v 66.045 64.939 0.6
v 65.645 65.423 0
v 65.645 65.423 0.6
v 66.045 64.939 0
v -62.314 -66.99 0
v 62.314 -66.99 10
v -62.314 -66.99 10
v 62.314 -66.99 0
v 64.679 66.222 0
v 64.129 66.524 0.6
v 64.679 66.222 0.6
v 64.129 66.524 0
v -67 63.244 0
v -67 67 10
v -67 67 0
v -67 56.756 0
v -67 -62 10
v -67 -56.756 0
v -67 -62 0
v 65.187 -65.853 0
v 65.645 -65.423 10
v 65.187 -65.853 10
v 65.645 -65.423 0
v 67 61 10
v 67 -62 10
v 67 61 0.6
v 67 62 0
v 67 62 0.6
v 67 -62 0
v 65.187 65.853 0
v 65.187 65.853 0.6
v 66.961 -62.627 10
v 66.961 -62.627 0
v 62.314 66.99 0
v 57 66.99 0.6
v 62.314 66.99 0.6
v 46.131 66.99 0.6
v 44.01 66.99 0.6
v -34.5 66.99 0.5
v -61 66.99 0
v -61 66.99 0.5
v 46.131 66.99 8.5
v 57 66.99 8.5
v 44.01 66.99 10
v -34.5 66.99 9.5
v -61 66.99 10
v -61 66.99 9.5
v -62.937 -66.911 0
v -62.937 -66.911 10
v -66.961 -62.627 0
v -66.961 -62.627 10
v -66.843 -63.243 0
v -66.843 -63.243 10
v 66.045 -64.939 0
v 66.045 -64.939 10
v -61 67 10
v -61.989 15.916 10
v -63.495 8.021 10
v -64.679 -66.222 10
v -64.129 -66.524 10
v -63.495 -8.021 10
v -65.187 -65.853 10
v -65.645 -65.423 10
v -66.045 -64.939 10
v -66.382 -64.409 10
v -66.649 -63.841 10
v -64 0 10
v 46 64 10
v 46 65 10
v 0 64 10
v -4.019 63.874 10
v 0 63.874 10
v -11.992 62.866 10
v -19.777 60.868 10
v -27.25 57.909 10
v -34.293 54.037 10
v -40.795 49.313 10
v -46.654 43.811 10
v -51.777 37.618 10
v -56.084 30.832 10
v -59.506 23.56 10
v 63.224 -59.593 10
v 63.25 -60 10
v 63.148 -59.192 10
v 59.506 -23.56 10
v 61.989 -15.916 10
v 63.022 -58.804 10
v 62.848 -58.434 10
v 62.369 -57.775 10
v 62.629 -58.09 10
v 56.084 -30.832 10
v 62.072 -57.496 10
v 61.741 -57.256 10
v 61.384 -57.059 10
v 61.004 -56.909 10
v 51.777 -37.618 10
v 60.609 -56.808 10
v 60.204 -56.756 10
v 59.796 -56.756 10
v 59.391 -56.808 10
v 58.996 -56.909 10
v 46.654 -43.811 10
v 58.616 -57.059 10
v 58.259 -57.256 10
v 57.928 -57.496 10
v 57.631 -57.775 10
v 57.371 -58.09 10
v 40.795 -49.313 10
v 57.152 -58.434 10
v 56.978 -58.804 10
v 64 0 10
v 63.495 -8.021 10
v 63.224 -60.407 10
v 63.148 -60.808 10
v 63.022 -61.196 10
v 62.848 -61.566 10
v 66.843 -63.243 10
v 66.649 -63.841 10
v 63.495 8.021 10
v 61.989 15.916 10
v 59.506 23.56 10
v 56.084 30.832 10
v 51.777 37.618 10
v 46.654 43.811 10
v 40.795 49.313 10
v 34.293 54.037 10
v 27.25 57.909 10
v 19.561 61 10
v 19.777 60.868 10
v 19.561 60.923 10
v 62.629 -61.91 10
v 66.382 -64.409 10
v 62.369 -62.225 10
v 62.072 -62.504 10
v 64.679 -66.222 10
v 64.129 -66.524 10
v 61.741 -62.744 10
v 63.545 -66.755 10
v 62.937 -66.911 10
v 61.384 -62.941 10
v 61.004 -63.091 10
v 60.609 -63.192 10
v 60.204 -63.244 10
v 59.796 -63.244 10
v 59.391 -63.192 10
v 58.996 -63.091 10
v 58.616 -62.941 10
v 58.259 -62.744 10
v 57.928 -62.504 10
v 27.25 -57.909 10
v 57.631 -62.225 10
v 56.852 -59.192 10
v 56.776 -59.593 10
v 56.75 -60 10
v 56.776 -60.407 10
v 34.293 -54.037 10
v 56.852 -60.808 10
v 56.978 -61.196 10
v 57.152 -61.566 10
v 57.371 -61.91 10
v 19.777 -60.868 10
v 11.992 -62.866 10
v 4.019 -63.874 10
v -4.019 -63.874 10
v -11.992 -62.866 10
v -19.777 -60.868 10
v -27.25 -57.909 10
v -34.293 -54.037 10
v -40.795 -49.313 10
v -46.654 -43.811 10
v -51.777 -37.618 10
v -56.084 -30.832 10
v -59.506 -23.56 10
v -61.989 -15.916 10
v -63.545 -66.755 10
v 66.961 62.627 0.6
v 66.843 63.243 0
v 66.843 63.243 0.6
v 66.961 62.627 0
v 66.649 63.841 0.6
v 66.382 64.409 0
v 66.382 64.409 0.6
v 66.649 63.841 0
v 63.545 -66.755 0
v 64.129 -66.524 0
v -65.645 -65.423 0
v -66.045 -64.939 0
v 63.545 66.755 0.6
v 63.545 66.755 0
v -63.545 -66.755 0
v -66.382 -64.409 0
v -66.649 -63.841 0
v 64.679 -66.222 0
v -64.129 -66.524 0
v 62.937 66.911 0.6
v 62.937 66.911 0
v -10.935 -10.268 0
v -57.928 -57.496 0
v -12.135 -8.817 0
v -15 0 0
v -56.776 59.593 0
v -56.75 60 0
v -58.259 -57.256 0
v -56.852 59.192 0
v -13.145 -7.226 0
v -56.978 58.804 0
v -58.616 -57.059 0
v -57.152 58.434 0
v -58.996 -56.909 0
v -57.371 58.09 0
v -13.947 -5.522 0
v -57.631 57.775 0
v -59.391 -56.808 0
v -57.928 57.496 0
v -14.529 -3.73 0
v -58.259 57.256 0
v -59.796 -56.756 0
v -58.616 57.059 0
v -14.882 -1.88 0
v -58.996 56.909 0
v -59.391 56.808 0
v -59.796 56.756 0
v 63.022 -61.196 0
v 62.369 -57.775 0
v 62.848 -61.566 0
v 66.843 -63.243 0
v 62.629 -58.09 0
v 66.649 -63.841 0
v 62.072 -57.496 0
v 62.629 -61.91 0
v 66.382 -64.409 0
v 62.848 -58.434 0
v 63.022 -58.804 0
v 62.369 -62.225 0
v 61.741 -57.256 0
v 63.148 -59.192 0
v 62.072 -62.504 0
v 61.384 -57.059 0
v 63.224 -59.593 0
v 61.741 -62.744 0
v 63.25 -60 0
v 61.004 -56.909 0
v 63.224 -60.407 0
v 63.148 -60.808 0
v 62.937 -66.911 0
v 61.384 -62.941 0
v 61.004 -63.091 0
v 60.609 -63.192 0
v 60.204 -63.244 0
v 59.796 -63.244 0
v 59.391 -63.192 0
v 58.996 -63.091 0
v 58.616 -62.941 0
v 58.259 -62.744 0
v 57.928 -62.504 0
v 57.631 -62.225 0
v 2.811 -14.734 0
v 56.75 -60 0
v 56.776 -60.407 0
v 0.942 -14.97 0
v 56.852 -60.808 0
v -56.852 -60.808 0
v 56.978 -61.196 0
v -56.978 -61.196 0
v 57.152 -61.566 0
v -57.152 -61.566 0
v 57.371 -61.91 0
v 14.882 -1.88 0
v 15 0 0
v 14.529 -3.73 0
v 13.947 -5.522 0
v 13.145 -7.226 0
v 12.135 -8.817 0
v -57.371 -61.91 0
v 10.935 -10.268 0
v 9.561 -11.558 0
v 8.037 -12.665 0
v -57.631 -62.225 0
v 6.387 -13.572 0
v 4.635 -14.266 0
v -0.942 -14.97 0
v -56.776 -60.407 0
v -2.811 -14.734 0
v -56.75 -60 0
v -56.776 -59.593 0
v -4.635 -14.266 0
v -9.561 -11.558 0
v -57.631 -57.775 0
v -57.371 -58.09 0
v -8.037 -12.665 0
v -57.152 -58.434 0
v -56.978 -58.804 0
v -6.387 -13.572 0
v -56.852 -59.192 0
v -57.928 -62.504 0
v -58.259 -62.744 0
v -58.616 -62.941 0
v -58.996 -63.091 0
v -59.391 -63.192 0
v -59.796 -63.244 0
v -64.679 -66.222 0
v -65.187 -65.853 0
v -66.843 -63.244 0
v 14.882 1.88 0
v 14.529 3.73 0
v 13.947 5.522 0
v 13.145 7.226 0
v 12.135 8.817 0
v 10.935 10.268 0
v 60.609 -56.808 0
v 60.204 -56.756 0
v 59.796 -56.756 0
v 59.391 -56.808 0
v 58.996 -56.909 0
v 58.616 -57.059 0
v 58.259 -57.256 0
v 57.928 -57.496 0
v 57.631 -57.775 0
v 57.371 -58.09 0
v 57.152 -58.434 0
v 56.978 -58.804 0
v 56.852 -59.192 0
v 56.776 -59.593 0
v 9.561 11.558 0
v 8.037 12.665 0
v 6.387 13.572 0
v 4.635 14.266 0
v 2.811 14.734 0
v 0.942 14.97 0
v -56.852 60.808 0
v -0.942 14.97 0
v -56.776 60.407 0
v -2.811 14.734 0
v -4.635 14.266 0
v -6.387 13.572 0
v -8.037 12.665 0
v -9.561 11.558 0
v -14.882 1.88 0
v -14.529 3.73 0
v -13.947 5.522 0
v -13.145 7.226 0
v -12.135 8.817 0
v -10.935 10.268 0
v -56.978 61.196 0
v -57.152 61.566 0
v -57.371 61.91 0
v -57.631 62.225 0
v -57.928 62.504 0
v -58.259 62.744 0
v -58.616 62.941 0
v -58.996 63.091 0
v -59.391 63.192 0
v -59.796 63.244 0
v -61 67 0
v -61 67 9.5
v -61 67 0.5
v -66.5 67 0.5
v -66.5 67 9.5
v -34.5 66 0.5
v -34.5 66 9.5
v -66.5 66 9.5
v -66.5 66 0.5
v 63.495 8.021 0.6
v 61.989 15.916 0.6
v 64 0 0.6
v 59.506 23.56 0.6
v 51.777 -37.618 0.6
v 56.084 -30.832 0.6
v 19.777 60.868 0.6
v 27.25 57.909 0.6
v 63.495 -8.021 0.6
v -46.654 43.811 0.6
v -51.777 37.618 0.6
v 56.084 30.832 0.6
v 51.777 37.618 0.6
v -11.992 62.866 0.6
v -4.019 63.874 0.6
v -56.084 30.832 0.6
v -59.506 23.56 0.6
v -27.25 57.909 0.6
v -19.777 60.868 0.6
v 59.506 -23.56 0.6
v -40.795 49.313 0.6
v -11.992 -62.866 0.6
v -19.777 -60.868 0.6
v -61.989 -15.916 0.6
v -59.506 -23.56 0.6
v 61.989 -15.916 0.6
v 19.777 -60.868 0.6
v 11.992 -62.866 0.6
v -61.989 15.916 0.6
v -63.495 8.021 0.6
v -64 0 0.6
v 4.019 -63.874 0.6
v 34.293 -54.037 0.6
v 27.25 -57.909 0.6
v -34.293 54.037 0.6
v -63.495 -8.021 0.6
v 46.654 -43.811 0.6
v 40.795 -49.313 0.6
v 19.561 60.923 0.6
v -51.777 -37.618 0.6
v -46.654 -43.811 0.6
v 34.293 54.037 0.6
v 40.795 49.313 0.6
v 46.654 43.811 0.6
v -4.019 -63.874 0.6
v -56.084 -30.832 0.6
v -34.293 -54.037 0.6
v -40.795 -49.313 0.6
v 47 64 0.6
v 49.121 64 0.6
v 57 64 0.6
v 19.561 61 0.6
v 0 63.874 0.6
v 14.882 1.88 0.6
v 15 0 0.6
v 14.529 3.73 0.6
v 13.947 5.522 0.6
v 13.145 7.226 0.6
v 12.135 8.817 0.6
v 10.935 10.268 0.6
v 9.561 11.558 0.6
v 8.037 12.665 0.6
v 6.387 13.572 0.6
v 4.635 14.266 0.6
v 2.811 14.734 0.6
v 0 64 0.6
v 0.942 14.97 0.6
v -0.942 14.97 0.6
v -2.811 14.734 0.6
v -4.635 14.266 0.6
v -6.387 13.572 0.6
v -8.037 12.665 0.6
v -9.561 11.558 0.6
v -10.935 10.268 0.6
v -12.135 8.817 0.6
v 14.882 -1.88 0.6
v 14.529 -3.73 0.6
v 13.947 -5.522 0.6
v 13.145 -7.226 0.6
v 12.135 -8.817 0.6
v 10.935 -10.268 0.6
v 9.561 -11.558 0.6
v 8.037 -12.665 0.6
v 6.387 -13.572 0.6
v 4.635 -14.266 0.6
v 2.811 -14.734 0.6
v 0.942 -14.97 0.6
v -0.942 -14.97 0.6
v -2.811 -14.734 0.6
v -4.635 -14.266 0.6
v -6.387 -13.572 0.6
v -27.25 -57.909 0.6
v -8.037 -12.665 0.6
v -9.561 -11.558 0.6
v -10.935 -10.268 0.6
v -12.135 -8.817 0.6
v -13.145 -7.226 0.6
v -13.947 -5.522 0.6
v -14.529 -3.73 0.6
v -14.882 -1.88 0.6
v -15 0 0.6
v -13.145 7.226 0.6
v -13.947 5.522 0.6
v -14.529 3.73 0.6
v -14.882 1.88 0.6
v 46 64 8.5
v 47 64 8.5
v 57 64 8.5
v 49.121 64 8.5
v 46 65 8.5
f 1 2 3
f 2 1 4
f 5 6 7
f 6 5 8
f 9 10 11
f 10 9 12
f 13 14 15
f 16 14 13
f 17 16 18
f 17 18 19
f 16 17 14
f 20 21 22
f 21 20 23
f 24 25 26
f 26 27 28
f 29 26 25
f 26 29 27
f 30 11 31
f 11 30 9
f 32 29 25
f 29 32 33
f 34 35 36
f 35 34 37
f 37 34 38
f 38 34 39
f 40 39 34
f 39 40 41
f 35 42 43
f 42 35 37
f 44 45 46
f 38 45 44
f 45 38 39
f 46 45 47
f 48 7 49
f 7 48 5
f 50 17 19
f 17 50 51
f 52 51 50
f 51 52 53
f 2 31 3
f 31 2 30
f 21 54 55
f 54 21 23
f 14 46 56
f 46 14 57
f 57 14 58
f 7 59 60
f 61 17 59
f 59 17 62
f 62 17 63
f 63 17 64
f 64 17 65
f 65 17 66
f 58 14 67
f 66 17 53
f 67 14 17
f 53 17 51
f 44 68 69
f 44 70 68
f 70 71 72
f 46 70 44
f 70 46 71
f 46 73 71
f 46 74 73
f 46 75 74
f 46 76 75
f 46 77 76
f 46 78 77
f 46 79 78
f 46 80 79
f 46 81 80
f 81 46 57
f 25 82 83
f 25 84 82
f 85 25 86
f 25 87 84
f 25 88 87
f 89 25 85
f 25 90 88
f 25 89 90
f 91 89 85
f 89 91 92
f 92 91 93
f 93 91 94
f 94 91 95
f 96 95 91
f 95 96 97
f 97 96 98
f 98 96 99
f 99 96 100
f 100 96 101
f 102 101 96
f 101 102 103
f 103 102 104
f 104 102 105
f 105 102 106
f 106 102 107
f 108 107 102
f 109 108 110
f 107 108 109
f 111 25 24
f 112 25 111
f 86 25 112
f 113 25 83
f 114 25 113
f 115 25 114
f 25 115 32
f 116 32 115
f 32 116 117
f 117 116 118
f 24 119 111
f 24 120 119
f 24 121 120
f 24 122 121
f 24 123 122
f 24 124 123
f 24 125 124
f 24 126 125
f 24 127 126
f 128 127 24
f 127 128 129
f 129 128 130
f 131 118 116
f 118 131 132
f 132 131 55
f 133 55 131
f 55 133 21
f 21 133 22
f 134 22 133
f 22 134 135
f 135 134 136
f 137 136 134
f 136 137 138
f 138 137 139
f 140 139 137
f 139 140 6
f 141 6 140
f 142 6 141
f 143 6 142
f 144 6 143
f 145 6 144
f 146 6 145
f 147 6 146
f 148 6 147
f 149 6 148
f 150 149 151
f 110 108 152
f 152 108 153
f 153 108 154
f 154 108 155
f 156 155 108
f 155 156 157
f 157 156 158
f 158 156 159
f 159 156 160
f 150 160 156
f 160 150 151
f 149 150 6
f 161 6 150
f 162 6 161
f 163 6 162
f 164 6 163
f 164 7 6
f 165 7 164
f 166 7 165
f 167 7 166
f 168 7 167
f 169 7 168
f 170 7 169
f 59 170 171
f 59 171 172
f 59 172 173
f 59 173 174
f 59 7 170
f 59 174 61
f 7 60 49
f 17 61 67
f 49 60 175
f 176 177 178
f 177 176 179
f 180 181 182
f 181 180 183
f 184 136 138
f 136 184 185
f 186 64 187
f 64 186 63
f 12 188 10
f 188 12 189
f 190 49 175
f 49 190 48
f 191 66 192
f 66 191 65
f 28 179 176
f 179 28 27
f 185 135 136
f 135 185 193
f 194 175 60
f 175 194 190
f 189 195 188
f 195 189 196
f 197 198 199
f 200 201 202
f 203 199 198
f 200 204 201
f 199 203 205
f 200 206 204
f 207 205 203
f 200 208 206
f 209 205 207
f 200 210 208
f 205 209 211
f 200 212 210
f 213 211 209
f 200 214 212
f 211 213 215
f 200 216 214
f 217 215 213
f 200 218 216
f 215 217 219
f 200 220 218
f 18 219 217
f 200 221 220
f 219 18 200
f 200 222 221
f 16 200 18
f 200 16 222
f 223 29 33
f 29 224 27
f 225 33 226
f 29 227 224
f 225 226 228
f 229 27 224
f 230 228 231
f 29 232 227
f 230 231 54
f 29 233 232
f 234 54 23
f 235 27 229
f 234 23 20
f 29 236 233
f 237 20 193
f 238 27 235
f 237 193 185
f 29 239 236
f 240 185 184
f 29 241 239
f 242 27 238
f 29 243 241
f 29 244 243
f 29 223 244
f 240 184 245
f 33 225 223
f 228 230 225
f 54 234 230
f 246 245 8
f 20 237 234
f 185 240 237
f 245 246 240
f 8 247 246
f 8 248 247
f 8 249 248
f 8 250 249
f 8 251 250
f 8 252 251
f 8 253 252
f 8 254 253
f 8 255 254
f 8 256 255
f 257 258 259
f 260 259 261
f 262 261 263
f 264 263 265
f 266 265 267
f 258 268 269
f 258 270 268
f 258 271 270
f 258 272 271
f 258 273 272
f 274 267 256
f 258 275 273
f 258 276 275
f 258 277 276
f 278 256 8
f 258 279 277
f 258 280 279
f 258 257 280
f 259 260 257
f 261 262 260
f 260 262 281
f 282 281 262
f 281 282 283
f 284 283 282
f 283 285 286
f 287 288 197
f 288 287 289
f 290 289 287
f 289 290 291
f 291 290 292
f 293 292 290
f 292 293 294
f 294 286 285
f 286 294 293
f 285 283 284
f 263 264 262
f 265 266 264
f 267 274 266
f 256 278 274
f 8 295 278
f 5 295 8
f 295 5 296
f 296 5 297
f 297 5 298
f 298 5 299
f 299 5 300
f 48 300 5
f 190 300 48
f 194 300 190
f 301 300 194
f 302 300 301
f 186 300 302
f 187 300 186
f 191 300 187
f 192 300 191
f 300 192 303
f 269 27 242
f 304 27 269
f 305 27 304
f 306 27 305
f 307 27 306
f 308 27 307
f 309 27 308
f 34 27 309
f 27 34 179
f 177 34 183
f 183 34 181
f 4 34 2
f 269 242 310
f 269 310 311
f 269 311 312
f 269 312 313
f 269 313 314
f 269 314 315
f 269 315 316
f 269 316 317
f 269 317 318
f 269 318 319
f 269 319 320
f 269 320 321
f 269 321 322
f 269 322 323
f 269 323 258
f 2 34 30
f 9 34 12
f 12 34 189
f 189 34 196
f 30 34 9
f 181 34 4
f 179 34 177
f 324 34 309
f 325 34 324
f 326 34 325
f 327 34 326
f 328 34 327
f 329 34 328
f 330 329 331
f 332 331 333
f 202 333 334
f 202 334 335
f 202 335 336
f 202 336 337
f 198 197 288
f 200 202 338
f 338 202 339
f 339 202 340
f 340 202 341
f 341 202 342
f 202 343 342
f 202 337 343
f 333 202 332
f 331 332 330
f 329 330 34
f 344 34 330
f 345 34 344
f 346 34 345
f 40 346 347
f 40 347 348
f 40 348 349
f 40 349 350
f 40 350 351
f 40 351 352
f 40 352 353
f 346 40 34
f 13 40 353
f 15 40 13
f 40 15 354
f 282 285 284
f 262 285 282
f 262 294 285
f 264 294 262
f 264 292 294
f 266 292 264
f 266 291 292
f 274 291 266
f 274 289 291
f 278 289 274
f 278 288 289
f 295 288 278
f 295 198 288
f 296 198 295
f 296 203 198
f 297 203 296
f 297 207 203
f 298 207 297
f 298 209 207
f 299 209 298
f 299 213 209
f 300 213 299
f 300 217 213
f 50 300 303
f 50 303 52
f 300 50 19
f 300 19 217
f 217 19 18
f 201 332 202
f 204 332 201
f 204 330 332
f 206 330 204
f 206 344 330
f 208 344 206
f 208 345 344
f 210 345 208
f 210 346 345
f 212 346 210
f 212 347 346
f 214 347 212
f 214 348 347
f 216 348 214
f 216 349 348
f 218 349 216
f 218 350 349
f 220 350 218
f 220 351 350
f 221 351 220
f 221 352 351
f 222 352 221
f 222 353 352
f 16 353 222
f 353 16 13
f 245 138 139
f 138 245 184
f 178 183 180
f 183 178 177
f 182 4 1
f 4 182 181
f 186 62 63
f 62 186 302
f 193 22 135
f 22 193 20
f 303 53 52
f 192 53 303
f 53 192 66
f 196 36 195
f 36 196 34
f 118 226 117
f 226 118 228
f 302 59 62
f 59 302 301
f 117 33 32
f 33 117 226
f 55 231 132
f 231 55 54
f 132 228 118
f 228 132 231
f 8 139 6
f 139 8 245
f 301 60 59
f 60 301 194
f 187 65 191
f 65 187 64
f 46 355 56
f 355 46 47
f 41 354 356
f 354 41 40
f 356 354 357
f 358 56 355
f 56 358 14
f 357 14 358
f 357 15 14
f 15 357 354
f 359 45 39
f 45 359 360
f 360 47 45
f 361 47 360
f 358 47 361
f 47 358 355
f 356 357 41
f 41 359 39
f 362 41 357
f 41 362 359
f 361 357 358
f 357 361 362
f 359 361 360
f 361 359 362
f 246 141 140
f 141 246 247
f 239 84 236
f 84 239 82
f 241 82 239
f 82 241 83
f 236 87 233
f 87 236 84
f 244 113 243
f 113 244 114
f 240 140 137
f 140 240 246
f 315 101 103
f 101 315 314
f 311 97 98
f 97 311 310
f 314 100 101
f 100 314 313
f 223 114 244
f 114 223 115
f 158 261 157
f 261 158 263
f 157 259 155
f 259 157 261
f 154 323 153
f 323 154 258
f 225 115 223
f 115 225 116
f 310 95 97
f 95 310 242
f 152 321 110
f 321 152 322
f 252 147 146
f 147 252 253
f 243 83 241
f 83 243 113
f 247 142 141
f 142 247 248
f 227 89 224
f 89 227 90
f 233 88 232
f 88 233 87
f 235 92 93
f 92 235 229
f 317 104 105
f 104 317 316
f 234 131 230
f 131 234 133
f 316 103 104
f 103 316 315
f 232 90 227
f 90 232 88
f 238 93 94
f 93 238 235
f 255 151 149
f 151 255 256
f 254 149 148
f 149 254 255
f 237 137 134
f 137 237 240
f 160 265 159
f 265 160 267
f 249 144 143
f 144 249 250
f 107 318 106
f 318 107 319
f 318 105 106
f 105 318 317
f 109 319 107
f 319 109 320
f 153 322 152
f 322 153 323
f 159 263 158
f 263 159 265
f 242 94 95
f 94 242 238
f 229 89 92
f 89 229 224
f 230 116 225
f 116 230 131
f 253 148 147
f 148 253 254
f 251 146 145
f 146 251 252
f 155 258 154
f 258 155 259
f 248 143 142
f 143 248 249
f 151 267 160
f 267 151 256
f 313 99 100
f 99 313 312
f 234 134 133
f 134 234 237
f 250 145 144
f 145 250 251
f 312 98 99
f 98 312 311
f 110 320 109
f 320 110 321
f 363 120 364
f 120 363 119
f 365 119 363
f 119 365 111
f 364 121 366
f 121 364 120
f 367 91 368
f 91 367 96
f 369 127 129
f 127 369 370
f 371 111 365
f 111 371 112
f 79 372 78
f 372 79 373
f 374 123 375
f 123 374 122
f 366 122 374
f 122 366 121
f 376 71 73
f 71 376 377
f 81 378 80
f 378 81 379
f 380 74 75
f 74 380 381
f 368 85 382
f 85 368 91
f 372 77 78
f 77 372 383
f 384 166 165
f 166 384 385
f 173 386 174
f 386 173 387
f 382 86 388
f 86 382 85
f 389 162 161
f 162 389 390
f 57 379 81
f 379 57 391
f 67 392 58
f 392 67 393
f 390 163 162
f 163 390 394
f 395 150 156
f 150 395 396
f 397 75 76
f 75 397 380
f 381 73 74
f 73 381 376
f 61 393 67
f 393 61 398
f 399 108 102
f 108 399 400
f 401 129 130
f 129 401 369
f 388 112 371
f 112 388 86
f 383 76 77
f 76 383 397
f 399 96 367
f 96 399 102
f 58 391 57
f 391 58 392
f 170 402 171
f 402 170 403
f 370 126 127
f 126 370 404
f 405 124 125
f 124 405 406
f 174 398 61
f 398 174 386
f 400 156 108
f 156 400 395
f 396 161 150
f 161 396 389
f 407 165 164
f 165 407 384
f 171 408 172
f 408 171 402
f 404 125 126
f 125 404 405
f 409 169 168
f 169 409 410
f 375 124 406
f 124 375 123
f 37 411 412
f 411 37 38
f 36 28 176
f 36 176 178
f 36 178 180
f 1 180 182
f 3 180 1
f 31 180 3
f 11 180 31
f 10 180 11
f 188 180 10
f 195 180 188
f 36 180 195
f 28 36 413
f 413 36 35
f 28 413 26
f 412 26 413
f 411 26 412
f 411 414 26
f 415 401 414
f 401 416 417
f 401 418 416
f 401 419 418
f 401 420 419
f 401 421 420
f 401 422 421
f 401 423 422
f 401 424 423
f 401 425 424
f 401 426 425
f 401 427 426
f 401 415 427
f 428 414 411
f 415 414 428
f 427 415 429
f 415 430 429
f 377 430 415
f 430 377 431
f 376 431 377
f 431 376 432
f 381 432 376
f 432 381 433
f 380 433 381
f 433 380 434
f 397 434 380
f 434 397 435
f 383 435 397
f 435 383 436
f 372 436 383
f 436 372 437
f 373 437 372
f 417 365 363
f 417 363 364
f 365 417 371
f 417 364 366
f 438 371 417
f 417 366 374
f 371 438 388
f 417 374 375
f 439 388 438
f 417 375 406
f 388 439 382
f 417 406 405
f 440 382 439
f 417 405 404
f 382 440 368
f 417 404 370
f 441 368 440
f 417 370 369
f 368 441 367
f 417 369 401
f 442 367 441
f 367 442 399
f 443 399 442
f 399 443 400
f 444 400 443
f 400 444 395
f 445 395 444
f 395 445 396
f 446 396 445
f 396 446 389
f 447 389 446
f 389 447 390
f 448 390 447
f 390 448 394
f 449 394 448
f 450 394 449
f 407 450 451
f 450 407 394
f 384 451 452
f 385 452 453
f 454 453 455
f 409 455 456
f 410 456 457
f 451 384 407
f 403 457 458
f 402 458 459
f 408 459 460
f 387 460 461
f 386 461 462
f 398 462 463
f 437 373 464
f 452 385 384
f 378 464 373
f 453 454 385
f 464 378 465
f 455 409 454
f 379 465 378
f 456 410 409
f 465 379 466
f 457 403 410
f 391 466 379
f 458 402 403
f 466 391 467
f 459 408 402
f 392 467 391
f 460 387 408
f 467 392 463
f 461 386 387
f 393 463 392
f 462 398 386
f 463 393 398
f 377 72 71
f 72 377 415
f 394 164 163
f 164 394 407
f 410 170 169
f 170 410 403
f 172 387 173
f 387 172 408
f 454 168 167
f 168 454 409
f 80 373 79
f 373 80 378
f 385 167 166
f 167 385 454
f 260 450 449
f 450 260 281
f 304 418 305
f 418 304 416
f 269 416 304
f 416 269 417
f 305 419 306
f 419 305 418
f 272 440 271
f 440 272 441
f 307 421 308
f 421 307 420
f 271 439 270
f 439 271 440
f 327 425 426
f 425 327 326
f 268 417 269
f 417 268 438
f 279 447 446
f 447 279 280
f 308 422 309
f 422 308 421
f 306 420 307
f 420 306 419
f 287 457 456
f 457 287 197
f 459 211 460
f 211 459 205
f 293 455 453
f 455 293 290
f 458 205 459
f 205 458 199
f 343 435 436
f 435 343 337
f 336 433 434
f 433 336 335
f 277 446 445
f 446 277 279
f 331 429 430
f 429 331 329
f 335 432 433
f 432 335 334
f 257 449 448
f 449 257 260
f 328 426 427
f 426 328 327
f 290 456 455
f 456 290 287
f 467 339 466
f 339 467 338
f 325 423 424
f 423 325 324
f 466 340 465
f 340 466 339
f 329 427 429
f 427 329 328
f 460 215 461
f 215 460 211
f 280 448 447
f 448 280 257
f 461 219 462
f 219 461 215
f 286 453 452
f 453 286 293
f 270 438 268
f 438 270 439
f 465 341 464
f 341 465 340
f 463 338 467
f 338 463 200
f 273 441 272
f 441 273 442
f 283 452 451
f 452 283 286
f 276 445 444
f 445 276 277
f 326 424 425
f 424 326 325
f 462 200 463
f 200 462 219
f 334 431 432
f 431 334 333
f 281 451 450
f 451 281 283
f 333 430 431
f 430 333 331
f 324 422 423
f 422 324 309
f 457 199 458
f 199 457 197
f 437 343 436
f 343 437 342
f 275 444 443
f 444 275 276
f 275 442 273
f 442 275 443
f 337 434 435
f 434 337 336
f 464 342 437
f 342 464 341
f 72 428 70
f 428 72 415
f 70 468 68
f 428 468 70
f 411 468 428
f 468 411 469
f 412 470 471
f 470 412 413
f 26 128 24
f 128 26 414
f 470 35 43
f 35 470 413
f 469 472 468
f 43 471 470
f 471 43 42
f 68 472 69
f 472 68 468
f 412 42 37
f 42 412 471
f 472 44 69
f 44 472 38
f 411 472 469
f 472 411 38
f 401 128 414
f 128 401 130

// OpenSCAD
$fn = 50;


difference() {
	union() {
		hull() {
			translate(v = [-62.0000000000, 62.0000000000, 0]) {
				cylinder(h = 10, r = 5);
			}
			translate(v = [62.0000000000, 62.0000000000, 0]) {
				cylinder(h = 10, r = 5);
			}
			translate(v = [-62.0000000000, -62.0000000000, 0]) {
				cylinder(h = 10, r = 5);
			}
			translate(v = [62.0000000000, -62.0000000000, 0]) {
				cylinder(h = 10, r = 5);
			}
		}
		translate(v = [-67.0000000000, 61.0000000000, 0]) {
			cube(size = [6, 6, 10]);
		}
	}
	union() {
		translate(v = [-67.5000000000, -60.0000000000, -250.0000000000]) {
			rotate(a = [0, 0, 0]) {
				difference() {
					union() {
						hull() {
							translate(v = [7.5000000000, 0, 0]) {
								cylinder(h = 250, r = 3.2500000000, r1 = 3.2500000000, r2 = 3.2500000000);
							}
							translate(v = [-7.5000000000, 0, 0]) {
								cylinder(h = 250, r = 3.2500000000, r1 = 3.2500000000, r2 = 3.2500000000);
							}
						}
					}
					union();
				}
			}
		}
		translate(v = [-67.5000000000, 60.0000000000, -250.0000000000]) {
			rotate(a = [0, 0, 0]) {
				difference() {
					union() {
						hull() {
							translate(v = [7.5000000000, 0, 0]) {
								cylinder(h = 250, r = 3.2500000000, r1 = 3.2500000000, r2 = 3.2500000000);
							}
							translate(v = [-7.5000000000, 0, 0]) {
								cylinder(h = 250, r = 3.2500000000, r1 = 3.2500000000, r2 = 3.2500000000);
							}
						}
					}
					union();
				}
			}
		}
		translate(v = [-66.5000000000, 66.0000000000, 0.5000000000]) {
			cube(size = [32, 1, 9.0000000000]);
		}
		translate(v = [60.0000000000, -60.0000000000, -50.0000000000]) {
			cylinder(h = 100, r = 3.2500000000);
		}
		translate(v = [0, 0, 0.6000000000]) {
			cylinder(h = 12.4000000000, r = 64.0000000000);
		}
		translate(v = [0, 0, -5.0000000000]) {
			cylinder(h = 10, r = 15.0000000000);
		}
		translate(v = [0.0000000000, 61.0000000000, 0.6000000000]) {
			cube(size = [67.0000000000, 3, 12.4000000000]);
		}
		translate(v = [57.0000000000, 61.0000000000, 0.6000000000]) {
			cube(size = [10, 6, 12.4000000000]);
		}
		translate(v = [46.0000000000, 61.0000000000, 8.5000000000]) {
			cube(size = [21, 6, 1.5000000000]);
		}
		translate(v = [43.2500000000, 67.7500000000, 0.6000000000]) {
			rotate(a = [0, 0, -45]) {
				cube(size = [7.5000000000, 1.5000000000, 12.4000000000]);
			}
		}
		translate(v = [12.0610000000, 59.0000000000, 0.6000000000]) {
			cube(size = [7.5000000000, 2, 9.4000000000]);
		}
	}
}
